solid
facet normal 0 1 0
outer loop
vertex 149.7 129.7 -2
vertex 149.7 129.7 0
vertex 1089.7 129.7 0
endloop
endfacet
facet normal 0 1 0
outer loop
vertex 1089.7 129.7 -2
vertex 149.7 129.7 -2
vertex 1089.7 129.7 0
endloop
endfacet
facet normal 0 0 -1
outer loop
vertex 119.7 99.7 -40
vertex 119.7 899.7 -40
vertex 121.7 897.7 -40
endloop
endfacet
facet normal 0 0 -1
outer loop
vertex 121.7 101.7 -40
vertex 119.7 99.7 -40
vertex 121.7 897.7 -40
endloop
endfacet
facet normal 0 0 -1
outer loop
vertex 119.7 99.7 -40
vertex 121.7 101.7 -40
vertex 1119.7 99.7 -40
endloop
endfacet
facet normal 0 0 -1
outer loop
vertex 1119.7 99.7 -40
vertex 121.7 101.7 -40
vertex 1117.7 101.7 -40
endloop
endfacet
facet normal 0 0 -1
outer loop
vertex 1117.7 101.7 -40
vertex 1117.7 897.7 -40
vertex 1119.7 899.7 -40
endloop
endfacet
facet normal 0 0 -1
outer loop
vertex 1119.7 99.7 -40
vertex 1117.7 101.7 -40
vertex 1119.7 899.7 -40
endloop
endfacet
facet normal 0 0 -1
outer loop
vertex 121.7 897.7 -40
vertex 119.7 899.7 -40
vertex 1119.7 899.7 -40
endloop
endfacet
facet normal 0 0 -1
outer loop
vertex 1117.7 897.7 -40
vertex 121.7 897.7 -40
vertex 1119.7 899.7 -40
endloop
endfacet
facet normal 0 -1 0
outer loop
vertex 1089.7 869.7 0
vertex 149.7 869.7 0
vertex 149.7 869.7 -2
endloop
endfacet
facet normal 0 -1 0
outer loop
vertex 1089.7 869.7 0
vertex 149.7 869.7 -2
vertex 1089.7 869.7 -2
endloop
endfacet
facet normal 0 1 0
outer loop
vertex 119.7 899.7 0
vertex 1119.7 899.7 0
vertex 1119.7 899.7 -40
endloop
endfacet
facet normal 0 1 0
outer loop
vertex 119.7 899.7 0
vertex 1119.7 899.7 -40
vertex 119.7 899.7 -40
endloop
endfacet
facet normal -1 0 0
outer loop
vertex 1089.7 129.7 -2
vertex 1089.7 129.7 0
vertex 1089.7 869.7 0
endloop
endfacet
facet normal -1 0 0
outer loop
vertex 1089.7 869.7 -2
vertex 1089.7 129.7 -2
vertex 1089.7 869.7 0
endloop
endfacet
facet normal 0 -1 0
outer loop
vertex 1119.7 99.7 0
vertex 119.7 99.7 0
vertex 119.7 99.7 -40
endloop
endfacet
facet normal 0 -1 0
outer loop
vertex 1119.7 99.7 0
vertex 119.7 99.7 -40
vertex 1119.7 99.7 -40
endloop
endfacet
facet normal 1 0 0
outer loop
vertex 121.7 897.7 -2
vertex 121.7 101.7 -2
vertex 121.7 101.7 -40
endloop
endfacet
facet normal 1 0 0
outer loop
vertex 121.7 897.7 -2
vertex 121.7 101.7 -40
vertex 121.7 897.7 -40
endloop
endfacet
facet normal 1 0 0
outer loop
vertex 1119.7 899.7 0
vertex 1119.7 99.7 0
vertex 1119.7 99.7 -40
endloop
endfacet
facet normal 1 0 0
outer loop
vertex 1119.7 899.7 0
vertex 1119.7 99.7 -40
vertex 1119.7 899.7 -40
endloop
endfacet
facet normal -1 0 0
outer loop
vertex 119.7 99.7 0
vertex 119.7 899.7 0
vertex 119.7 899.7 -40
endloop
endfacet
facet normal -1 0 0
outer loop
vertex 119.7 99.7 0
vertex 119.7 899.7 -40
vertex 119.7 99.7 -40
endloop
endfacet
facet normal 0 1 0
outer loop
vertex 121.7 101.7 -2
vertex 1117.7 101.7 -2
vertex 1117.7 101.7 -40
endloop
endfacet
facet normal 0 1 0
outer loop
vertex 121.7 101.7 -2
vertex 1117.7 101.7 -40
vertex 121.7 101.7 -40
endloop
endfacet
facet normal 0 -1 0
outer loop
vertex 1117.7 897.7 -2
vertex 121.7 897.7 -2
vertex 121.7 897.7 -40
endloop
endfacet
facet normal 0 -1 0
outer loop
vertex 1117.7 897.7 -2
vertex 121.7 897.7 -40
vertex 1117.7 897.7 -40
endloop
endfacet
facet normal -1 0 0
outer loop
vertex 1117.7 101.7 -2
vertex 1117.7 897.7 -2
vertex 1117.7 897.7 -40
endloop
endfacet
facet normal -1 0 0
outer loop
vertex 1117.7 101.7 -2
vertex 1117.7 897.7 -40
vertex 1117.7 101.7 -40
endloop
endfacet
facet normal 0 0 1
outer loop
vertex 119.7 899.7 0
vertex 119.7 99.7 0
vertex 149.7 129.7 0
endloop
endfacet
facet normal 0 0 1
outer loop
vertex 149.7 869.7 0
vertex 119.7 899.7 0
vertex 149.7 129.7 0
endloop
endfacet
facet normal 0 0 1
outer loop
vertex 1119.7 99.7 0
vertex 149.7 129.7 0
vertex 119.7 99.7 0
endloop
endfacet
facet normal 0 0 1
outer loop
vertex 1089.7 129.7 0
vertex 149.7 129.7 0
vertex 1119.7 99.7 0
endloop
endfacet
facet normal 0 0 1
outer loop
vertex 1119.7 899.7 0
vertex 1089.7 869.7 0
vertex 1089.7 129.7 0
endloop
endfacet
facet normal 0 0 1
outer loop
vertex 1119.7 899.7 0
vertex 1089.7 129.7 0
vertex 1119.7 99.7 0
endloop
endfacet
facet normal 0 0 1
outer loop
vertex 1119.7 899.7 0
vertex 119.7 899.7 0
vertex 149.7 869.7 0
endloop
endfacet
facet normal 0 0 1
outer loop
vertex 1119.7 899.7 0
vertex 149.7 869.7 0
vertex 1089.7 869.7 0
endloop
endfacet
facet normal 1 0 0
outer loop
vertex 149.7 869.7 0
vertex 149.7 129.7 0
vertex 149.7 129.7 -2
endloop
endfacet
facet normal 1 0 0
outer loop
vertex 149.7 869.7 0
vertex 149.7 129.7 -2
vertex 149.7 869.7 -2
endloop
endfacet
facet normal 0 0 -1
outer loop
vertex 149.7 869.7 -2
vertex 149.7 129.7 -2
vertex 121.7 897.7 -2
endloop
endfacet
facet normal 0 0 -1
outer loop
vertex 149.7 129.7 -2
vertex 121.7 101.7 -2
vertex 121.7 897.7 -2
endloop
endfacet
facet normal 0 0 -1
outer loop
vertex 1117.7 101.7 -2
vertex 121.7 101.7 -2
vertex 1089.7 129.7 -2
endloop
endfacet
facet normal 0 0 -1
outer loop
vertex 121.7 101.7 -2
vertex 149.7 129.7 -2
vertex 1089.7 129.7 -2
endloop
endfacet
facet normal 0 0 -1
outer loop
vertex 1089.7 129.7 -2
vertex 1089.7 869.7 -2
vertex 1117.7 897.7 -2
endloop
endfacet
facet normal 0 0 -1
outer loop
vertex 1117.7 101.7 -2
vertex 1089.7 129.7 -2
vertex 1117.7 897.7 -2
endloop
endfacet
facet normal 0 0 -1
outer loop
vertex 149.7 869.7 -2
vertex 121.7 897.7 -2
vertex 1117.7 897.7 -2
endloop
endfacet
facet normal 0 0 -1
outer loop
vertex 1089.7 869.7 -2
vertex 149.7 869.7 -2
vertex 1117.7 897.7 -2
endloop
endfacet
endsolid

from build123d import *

# Parameters (mm, degrees)
F0_W     = 940
F0_H     = 2
F0_W_2   = 2
F0_H_2   = 28
F0_W_3   = 28
F1_DEPTH = 40
F0_H_3   = 740
F2_DEPTH = 2


with BuildPart() as f1:
    # F0 (on Top) → F1 (new body)
    with BuildSketch(Plane.XY):
        Polygon((119.6999707818, 869.6999302506), (121.6999707818, 869.6999302506), (121.6999707818, 897.6999302506), (149.6999707818, 897.6999302506), (149.6999707818, 899.6999302506), (119.6999707818, 899.6999302506), align=None)
        with Locations((619.6999707818, 898.6999302506)):
            Rectangle(F0_W, F0_H)
        Polygon((119.6999707818, 179.6999302506), (119.6999707818, 129.6999302506), (121.6999707818, 129.6999302506), (121.6999707818, 869.6999302506), (119.6999707818, 869.6999302506), align=None)
        Polygon((1117.6999707818, 897.6999302506), (1117.6999707818, 869.6999302506), (1119.6999707818, 869.6999302506), (1119.6999707818, 899.6999302506), (1089.6999707818, 899.6999302506), (1089.6999707818, 897.6999302506), align=None)
        Polygon((1117.6999707818, 869.6999302506), (1117.6999707818, 129.6999302506), (1119.6999707818, 129.6999302506), (1119.6999707818, 179.6999302506), (1119.6999707818, 869.6999302506), align=None)
        with Locations((1118.6999707818, 115.6999302506)):
            Rectangle(F0_W_2, F0_H_2)
        with Locations((1118.6999707818, 100.6999302506)):
            Rectangle(F0_W_2, F0_H)
        with Locations((1103.6999707818, 100.6999302506)):
            Rectangle(F0_W_3, F0_H)
        with Locations((619.6999707818, 100.6999302506)):
            Rectangle(F0_W, F0_H)
        with Locations((135.6999707818, 100.6999302506)):
            Rectangle(F0_W_3, F0_H)
        with Locations((120.6999707818, 100.6999302506)):
            Rectangle(F0_W_2, F0_H)
        with Locations((120.6999707818, 115.6999302506)):
            Rectangle(F0_W_2, F0_H_2)
    extrude(amount=-F1_DEPTH)

    # F0 (on Top) → F2 (join)
    with BuildSketch(Plane.XY):
        Polygon((121.6999707818, 129.6999302506), (121.6999707818, 101.6999302506), (149.6999707818, 101.6999302506), (1089.6999707818, 101.6999302506), (1117.6999707818, 101.6999302506), (1117.6999707818, 129.6999302506), (1117.6999707818, 869.6999302506), (1117.6999707818, 897.6999302506), (1089.6999707818, 897.6999302506), (149.6999707818, 897.6999302506), (121.6999707818, 897.6999302506), (121.6999707818, 869.6999302506), align=None)
        with Locations((619.6999707818, 499.6999302506)):
            Rectangle(F0_W, F0_H_3, mode=Mode.SUBTRACT)
    extrude(amount=-F2_DEPTH)


solid = f1.part
